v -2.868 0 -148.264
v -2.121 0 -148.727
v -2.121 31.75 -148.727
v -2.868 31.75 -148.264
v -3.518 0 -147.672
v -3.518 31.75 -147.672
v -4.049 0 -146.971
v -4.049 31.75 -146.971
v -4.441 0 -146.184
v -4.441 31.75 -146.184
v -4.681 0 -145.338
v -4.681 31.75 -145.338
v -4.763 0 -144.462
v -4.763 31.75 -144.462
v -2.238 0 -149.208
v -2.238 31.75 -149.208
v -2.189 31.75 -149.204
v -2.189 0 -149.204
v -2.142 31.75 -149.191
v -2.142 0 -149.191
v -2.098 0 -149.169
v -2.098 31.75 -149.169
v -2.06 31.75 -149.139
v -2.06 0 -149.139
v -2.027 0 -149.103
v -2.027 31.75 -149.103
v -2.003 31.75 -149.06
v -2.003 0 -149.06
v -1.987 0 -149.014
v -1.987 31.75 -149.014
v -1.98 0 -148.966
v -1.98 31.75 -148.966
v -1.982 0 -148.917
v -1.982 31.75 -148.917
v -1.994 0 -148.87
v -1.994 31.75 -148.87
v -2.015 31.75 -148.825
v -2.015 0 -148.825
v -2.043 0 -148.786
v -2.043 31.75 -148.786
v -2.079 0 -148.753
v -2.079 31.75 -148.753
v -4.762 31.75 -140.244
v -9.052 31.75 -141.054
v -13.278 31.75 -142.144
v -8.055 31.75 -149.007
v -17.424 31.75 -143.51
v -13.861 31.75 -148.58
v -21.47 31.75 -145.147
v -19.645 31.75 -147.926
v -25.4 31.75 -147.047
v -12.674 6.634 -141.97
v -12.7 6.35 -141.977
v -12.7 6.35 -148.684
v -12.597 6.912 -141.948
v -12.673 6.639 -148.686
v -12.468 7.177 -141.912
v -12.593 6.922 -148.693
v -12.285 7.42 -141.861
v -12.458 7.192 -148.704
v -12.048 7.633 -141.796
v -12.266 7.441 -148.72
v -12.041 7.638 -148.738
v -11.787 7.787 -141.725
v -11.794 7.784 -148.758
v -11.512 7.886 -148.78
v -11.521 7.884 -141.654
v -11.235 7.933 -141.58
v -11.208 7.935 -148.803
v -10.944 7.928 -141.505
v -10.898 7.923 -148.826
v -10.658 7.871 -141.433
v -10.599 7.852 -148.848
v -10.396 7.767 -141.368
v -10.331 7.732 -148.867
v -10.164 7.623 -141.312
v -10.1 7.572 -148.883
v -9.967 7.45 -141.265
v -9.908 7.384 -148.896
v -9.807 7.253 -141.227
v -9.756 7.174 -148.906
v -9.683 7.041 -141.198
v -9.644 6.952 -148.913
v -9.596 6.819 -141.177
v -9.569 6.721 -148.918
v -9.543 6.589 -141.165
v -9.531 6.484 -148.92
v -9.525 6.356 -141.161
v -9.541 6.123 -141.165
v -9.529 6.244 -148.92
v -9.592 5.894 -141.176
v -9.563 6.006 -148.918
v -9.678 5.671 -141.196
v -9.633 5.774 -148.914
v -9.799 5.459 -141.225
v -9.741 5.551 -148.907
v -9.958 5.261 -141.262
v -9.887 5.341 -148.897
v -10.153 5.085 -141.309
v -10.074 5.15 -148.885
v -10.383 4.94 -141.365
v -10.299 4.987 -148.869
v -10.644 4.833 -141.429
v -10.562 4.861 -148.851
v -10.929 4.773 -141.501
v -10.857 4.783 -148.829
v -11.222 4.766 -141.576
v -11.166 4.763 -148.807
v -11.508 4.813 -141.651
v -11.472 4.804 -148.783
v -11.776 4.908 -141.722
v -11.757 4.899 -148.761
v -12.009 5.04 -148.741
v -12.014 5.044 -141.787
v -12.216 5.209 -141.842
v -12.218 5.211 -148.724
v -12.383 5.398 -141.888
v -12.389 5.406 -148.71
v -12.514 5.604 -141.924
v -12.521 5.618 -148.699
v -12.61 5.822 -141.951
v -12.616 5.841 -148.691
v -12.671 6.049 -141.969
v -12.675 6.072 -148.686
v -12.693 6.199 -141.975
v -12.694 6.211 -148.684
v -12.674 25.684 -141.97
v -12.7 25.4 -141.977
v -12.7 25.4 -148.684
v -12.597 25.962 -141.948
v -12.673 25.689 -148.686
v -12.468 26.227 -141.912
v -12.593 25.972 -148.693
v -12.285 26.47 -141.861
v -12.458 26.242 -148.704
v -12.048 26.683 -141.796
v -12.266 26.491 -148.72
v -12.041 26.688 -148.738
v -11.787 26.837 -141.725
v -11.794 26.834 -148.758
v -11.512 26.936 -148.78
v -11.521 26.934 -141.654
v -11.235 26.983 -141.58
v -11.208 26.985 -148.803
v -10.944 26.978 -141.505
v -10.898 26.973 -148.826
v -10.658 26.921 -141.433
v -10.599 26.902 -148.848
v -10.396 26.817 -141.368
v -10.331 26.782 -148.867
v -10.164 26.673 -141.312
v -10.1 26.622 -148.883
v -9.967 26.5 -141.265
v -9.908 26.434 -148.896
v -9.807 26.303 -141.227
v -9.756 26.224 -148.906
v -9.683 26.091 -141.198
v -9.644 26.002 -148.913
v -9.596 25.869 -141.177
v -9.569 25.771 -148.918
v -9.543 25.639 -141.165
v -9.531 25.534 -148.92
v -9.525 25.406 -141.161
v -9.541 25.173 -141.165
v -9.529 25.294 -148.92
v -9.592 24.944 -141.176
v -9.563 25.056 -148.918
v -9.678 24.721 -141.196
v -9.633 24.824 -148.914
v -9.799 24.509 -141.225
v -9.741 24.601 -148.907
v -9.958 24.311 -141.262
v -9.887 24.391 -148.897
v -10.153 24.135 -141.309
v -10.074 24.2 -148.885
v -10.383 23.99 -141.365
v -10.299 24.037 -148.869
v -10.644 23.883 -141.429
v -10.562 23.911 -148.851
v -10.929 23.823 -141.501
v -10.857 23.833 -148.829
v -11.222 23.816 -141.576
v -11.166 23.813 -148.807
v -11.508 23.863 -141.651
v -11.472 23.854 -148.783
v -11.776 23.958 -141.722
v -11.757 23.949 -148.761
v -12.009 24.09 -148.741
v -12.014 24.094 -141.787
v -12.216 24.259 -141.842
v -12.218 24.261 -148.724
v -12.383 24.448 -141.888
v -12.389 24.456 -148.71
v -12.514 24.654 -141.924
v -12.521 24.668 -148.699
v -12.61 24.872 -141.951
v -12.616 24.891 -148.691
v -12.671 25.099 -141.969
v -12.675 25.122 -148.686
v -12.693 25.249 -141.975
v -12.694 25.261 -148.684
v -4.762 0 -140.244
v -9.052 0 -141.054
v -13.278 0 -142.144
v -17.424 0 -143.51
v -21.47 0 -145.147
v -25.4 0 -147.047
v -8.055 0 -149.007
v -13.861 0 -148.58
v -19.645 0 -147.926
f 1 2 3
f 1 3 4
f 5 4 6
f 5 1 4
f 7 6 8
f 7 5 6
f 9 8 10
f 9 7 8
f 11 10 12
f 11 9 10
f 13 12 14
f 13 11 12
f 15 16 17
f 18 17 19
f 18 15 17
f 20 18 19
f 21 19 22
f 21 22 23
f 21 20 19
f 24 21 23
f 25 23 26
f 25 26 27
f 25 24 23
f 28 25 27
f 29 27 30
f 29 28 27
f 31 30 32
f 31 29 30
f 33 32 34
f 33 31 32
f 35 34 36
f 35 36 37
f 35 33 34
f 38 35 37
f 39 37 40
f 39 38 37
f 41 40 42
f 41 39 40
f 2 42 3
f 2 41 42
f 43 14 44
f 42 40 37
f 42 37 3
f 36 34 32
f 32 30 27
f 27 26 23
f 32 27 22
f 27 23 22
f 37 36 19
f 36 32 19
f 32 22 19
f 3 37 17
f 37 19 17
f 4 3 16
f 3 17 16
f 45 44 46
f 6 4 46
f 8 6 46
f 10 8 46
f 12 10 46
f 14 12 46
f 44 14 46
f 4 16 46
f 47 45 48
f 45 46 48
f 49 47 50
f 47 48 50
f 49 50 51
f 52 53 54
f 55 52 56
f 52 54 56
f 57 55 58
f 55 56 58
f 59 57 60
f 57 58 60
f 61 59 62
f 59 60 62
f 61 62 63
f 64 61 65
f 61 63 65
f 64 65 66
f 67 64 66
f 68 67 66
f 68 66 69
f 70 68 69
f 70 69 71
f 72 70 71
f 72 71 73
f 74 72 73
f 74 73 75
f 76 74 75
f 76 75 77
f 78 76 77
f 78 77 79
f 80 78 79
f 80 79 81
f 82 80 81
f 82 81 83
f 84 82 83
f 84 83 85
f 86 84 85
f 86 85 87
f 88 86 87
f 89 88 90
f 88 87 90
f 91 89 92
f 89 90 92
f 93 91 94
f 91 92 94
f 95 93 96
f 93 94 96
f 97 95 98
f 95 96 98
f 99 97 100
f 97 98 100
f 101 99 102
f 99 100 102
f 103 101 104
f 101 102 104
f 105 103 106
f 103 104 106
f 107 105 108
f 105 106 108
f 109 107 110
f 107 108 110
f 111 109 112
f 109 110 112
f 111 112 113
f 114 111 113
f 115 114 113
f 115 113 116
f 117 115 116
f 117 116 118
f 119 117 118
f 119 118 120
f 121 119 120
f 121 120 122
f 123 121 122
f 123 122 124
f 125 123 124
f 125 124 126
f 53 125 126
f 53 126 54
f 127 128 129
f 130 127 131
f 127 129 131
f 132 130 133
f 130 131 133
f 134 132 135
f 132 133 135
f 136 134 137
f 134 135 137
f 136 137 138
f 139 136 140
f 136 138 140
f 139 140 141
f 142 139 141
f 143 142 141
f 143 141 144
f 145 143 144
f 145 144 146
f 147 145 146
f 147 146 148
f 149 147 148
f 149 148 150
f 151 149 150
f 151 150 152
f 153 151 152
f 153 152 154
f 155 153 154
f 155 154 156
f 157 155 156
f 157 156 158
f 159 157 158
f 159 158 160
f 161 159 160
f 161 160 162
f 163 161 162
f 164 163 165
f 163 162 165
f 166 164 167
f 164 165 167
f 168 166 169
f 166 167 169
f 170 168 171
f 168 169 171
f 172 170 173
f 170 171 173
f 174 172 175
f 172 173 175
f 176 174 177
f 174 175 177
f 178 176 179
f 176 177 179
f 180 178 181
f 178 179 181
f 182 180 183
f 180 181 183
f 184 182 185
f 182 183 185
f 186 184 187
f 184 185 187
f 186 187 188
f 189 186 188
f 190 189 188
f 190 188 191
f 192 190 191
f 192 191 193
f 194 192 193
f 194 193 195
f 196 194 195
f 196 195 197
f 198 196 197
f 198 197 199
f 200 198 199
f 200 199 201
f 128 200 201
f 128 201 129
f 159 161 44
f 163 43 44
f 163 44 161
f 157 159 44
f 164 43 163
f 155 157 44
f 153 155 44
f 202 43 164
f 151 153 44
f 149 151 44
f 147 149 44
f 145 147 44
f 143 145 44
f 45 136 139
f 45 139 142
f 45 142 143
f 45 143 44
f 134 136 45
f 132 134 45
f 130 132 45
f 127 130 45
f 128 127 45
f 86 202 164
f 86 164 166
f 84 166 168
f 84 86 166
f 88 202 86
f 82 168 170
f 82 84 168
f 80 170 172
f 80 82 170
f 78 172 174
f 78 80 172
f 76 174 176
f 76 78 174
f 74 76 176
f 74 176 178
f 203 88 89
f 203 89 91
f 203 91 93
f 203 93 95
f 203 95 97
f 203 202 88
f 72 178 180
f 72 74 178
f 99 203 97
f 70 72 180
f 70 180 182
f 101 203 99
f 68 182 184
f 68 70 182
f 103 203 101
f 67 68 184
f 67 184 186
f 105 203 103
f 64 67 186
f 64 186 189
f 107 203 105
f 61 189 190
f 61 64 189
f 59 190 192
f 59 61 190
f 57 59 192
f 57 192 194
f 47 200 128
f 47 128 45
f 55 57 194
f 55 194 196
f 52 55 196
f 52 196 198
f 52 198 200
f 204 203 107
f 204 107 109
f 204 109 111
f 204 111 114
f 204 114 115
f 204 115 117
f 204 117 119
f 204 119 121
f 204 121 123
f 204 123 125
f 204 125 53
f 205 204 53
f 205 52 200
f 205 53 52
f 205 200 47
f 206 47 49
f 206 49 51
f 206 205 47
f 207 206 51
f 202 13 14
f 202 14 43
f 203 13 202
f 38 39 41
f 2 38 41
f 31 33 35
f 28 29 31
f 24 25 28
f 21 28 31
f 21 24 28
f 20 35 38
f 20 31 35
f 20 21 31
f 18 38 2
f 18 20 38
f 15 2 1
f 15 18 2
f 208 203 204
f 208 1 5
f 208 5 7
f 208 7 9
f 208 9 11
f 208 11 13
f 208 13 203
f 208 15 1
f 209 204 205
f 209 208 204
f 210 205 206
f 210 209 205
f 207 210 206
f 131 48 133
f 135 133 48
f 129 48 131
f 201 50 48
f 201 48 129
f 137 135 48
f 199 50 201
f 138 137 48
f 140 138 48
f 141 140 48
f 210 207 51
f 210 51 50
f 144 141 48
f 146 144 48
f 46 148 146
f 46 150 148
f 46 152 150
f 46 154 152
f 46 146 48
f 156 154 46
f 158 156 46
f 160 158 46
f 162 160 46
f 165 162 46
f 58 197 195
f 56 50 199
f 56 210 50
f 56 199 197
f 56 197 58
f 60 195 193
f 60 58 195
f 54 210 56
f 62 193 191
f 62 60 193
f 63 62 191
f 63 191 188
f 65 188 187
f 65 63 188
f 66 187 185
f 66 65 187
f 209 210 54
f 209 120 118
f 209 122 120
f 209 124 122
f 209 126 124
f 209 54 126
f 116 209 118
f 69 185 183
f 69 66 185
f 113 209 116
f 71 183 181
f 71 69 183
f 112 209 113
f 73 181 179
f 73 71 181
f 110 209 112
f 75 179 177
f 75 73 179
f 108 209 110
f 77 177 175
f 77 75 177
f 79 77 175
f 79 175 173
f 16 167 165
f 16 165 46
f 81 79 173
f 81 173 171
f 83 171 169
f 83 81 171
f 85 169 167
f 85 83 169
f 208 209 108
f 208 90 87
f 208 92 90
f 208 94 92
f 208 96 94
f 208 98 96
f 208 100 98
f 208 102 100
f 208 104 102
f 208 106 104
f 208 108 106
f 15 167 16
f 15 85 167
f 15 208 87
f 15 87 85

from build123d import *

# Parameters (mm, degrees)
BOSS_EXTRUDE1_DEPTH = 31.75
SKETCH2_R           = 1.5875
CUT_EXTRUDE1_DEPTH  = 9.980818595


with BuildPart() as part:
    # Sketch1 → Boss-Extrude1 (new body)
    with BuildSketch(Plane(origin=(0, 0, 0), x_dir=(1, 0, 0), z_dir=(0, 1, 0))):
        with BuildLine():
            Line((-4.7625, 144.4625), (-4.7625, 140.244181405))
            ThreePointArc((-4.7625, 140.244181405), (-15.362391405, 142.792956785), (-25.4, 147.047409447))
            ThreePointArc((-25.4, 147.047409447), (-13.860926819, 148.579861801), (-2.237511623, 149.208224193))
            ThreePointArc((-2.237511623, 149.208224193), (-1.986877125, 149.014193897), (-2.120604202, 148.726822228))
            ThreePointArc((-2.120604202, 148.726822228), (-4.048504895, 146.97068946), (-4.7625, 144.4625))
        make_face()
    extrude(amount=BOSS_EXTRUDE1_DEPTH)

    # Sketch2 → Cut-Extrude1 (cut, through all)
    with BuildSketch(Plane(origin=(0, 0, -149.225), x_dir=(-1, 0, 0), z_dir=(0, 0, -1))):
        with Locations((11.1125, 25.4)):
            Circle(SKETCH2_R)
        with Locations((11.1125, 6.35)):
            Circle(SKETCH2_R)
    extrude(amount=-CUT_EXTRUDE1_DEPTH, mode=Mode.SUBTRACT)


solid = part.part
